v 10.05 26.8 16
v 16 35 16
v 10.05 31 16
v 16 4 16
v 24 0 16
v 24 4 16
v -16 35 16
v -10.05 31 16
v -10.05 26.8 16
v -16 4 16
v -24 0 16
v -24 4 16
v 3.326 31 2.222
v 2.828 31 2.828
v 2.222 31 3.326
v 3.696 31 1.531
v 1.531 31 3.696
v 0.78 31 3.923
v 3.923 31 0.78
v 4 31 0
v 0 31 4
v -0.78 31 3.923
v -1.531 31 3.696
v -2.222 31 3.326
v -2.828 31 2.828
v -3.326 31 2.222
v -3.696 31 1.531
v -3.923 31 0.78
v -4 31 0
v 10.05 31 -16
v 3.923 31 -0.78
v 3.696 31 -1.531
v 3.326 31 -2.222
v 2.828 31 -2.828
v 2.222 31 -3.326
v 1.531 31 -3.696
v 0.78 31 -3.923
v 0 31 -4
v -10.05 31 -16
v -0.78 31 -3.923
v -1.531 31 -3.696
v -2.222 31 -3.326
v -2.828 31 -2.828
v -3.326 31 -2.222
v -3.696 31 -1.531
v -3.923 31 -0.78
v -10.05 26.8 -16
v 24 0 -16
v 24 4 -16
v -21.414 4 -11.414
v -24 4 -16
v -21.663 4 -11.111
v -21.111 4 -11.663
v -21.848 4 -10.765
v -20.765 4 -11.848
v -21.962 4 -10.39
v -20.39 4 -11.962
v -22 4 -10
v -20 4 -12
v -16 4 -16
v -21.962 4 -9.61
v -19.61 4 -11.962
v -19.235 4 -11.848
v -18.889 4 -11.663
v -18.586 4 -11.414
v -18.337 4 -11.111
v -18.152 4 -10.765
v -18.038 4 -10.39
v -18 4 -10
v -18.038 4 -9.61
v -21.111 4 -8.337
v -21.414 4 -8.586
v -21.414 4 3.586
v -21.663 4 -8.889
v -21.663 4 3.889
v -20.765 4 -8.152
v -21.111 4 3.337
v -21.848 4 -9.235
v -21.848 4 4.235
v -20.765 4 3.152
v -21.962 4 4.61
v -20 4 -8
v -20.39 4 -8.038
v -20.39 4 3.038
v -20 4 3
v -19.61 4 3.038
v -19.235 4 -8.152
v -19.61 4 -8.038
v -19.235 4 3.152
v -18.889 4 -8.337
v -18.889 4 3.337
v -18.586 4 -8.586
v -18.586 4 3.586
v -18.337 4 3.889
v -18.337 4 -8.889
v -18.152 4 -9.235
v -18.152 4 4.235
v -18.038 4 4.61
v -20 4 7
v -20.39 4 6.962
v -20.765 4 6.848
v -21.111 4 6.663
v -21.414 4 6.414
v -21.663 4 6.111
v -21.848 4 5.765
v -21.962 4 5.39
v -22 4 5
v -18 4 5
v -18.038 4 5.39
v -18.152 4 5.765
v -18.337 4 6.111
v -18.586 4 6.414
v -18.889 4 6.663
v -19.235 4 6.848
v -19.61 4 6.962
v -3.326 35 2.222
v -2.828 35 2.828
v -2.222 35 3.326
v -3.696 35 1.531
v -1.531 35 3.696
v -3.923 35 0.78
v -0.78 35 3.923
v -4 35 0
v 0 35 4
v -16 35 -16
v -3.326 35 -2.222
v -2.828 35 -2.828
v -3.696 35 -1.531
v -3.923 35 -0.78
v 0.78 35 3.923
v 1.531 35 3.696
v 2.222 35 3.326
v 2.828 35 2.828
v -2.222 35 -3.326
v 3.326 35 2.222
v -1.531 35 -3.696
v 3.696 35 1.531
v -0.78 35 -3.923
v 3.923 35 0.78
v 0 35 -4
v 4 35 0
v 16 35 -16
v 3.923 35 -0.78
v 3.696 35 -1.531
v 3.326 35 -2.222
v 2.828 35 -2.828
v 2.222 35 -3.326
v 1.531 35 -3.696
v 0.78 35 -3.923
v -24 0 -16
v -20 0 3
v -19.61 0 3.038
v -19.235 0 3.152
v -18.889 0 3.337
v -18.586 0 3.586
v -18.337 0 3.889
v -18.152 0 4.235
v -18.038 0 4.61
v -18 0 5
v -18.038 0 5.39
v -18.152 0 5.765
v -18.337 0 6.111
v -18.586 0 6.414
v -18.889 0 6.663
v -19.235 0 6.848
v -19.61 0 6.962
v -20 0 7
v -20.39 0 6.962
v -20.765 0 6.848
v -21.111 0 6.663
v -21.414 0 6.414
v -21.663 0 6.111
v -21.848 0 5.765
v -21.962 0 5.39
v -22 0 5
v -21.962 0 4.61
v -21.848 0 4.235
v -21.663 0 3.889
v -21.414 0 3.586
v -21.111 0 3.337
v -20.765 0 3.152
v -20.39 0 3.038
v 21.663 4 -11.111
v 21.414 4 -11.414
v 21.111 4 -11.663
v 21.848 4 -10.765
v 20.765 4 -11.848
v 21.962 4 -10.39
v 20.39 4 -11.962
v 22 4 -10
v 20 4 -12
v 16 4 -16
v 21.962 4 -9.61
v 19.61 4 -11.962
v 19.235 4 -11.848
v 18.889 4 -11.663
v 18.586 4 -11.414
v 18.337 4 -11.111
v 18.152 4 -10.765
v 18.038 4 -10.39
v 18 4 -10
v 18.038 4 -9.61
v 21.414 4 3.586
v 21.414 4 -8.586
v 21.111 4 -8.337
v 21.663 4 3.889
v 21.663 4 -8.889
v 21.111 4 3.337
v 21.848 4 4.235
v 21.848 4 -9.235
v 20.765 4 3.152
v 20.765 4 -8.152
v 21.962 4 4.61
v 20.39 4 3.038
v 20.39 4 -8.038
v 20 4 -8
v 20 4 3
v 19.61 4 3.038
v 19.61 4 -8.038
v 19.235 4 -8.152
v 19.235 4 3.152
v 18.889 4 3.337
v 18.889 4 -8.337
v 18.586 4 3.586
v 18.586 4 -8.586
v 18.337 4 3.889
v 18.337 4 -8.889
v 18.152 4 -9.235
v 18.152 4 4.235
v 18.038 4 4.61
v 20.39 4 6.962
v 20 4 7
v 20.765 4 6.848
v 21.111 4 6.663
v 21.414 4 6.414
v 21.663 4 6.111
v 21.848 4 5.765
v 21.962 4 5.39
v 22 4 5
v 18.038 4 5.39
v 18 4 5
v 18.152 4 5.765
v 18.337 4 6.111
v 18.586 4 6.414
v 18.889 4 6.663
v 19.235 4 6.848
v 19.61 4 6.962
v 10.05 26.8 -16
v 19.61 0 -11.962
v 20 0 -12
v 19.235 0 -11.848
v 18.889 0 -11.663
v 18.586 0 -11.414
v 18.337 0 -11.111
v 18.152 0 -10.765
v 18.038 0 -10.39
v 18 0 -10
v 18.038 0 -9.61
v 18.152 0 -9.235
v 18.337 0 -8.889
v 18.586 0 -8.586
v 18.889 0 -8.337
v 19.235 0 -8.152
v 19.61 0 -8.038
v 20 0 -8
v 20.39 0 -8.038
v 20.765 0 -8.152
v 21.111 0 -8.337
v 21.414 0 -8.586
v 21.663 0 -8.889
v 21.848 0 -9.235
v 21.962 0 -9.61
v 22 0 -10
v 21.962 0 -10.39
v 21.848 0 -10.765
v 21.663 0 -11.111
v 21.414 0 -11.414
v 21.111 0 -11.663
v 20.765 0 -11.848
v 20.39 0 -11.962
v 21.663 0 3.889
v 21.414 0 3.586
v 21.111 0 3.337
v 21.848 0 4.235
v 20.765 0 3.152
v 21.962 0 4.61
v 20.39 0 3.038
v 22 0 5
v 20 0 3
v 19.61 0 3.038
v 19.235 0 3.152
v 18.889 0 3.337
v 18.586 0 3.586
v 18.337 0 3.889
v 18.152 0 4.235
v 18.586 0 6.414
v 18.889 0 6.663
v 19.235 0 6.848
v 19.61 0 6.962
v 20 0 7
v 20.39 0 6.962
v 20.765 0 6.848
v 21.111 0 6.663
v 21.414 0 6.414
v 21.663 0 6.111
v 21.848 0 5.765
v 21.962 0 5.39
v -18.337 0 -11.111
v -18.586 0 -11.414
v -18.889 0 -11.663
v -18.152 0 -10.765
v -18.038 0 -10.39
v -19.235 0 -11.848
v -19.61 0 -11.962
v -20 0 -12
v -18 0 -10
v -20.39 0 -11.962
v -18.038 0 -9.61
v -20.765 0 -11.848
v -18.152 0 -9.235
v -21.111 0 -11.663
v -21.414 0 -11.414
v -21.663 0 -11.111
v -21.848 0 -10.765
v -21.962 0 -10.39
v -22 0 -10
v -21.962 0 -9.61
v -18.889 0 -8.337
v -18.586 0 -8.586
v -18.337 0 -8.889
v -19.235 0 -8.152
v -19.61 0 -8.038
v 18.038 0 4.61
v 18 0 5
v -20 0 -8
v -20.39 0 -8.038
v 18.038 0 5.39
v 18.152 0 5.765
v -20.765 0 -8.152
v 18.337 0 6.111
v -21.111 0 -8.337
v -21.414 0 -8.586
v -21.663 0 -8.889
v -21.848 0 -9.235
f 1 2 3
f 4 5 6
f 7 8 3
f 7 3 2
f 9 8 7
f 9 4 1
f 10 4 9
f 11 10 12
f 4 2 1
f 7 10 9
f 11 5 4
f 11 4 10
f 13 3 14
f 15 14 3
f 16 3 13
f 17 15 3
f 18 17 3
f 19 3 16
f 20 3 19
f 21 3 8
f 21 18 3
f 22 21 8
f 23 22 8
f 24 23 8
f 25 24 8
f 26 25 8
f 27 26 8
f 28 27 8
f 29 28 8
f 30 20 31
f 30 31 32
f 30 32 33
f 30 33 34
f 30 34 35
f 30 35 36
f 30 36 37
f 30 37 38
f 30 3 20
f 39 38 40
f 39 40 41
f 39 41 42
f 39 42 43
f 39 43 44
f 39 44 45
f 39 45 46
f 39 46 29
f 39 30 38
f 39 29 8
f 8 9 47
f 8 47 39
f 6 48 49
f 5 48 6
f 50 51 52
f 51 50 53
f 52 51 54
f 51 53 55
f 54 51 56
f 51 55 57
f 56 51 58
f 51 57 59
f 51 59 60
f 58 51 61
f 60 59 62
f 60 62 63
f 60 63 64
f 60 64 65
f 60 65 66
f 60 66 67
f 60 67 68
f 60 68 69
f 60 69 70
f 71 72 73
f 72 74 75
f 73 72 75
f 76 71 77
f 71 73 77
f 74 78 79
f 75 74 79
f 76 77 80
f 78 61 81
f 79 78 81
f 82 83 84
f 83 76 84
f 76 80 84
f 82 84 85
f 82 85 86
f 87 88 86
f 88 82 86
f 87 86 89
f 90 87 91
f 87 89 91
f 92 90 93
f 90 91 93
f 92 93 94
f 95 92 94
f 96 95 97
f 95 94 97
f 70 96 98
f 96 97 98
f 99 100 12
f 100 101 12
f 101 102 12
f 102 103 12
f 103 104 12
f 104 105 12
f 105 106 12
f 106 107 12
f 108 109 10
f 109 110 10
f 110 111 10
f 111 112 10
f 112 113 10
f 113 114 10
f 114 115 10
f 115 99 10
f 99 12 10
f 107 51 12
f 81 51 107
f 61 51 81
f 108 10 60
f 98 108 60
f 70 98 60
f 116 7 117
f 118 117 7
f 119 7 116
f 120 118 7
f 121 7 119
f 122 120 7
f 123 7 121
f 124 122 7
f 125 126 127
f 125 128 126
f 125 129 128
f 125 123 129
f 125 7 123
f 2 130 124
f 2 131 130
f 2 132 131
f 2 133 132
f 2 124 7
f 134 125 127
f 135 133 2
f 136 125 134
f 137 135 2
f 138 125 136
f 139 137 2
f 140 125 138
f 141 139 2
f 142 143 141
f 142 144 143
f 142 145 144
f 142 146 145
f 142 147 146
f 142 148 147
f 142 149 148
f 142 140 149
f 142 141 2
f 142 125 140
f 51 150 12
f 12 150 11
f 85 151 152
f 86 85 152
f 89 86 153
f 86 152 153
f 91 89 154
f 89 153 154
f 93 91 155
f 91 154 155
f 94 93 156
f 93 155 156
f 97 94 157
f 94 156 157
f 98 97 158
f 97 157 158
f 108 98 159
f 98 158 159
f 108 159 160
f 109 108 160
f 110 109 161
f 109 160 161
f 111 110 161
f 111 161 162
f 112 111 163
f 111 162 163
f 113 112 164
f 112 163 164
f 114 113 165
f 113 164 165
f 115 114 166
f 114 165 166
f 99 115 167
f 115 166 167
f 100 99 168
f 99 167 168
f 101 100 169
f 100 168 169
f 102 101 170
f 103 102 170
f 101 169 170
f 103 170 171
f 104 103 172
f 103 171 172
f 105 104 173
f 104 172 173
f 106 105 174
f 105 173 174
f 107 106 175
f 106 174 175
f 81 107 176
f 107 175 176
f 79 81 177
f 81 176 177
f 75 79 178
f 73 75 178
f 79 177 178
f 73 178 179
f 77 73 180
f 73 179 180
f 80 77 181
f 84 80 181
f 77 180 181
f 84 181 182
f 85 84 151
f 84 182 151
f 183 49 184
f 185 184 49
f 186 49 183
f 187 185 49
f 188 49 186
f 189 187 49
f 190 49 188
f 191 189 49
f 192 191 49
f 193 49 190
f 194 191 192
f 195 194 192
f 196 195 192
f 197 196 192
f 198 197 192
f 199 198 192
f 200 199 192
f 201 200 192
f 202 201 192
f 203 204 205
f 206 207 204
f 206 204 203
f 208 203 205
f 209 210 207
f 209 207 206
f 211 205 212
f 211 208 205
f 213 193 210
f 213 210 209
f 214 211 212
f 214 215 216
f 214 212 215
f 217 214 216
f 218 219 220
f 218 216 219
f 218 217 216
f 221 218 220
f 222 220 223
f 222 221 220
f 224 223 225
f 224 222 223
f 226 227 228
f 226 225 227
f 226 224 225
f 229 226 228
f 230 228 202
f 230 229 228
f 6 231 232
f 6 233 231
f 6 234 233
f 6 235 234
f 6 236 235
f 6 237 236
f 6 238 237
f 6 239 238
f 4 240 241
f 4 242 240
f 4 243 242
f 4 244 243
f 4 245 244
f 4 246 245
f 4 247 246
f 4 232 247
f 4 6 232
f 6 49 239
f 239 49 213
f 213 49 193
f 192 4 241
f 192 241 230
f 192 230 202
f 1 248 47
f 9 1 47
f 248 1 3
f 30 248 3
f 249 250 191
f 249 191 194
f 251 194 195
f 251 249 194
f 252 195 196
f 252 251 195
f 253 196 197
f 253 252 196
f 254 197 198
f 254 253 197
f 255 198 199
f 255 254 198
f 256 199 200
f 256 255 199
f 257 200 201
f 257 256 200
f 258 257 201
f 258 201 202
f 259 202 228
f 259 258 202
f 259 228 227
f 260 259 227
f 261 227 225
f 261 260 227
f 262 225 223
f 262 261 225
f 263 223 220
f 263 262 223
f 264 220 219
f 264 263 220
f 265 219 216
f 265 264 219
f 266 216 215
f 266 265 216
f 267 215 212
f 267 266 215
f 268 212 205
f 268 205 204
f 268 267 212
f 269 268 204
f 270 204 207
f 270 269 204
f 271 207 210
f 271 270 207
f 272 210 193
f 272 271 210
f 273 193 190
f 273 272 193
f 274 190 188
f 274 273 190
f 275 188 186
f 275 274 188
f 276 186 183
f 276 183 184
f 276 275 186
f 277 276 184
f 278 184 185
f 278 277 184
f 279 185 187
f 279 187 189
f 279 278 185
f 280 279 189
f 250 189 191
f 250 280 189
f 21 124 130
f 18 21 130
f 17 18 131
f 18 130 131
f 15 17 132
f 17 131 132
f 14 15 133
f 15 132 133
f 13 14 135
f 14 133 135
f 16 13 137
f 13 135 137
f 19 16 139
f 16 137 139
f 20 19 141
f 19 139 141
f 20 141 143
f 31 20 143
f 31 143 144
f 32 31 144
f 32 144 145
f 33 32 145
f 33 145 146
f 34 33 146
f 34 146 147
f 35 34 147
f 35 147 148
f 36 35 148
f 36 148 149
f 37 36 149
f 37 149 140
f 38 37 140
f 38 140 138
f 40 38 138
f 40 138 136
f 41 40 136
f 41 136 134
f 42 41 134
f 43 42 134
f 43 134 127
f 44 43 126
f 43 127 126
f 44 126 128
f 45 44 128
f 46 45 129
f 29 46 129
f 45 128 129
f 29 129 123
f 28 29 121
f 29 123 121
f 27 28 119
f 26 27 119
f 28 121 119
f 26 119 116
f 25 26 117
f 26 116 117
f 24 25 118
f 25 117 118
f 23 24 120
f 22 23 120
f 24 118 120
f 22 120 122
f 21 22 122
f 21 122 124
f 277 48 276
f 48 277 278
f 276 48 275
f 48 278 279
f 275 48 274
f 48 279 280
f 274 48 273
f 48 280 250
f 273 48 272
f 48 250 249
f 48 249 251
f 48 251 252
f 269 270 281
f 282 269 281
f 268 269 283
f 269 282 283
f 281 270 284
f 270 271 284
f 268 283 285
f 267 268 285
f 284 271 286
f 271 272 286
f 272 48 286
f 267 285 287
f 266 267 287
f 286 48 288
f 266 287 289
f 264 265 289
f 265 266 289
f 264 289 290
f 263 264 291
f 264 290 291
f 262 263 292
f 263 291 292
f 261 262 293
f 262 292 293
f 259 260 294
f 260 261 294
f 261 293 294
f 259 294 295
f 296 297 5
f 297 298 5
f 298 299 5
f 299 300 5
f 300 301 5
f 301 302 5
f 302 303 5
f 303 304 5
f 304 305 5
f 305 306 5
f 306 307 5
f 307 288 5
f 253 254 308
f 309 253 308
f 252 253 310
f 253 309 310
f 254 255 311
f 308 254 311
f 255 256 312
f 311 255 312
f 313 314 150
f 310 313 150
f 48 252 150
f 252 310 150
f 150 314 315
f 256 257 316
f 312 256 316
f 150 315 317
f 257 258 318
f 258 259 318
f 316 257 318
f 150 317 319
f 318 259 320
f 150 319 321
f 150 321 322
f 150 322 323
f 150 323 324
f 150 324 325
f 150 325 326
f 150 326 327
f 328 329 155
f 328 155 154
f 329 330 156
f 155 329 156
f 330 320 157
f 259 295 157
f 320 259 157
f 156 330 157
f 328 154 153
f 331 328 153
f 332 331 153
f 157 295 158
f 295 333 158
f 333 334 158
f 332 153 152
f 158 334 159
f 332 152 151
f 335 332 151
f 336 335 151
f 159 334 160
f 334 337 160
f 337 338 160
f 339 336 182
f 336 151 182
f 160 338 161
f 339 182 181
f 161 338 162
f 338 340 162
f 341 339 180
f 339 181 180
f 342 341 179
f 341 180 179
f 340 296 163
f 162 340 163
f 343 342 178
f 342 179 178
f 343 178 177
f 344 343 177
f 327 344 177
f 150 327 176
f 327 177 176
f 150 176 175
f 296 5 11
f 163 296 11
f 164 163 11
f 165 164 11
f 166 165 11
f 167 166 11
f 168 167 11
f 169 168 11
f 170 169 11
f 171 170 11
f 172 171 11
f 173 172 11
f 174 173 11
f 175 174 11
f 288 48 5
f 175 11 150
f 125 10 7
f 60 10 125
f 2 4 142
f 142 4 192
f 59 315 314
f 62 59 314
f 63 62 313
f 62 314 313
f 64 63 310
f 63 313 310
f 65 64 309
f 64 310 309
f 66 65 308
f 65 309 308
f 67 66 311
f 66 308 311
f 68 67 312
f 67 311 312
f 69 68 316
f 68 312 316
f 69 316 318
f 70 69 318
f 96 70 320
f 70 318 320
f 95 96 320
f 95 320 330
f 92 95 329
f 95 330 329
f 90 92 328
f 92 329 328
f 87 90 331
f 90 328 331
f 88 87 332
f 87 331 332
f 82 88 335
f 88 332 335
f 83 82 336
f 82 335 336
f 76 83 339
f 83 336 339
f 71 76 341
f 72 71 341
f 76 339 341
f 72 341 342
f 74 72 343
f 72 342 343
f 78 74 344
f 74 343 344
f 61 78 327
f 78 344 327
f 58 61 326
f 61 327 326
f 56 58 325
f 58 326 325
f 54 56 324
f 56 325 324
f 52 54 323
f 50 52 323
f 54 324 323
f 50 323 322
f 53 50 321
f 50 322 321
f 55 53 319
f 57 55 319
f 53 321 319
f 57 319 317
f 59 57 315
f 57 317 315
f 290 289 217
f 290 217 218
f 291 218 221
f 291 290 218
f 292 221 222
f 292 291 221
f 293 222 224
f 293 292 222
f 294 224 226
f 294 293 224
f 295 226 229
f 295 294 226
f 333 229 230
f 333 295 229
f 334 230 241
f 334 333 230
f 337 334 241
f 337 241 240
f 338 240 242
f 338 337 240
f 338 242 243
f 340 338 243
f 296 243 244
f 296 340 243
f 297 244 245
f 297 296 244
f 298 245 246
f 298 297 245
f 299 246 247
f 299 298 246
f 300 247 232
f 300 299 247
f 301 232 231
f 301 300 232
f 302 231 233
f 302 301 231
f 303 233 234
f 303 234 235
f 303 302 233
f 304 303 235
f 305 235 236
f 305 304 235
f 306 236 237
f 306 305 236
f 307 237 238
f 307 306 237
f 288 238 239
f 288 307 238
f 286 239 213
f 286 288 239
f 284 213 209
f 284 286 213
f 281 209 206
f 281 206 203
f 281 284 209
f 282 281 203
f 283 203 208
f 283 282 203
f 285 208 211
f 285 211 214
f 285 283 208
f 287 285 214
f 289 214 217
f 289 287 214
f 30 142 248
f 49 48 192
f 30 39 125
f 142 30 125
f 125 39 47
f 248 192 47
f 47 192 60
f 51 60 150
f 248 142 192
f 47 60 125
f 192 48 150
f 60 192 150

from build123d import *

# Parameters (mm, degrees)
SKETCH1_W           = 32
SKETCH1_H           = 32
BOSS_EXTRUDE1_DEPTH = 35
SKETCH2_W           = 8
SKETCH2_H           = 32
SKETCH2_R           = 2
BOSS_EXTRUDE2_DEPTH = 4
CUT_EXTRUDE1_REACH  = 55.151
SKETCH4_W           = 20.1
SKETCH4_H           = 4.2
CUT_EXTRUDE2_REACH  = 47.354
SKETCH5_R           = 4


with BuildPart() as part:
    # Sketch1 → Boss-Extrude1 (new body)
    with BuildSketch(Plane(origin=(0, 0, 0), x_dir=(1, 0, 0), z_dir=(0, 1, 0))):
        Rectangle(SKETCH1_W, SKETCH1_H)
    extrude(amount=BOSS_EXTRUDE1_DEPTH)

    # Sketch2 → Boss-Extrude2 (add)
    with BuildSketch(Plane.XZ):
        with Locations((-20, 0)):
            Rectangle(SKETCH2_W, SKETCH2_H)
        with Locations(Location((-20, 5, 0), (0, 0, 270))):
            Circle(SKETCH2_R, mode=Mode.SUBTRACT)
        with Locations(Location((-20, -10, 0), (0, 0, 270))):
            Circle(SKETCH2_R, mode=Mode.SUBTRACT)
    boss_extrude2 = extrude(amount=-BOSS_EXTRUDE2_DEPTH)

    # Mirror1: Boss-Extrude2 across plane
    add(boss_extrude2.mirror(Plane(origin=(0, 0, 0), x_dir=(0, 0, 1), z_dir=(1, 0, 0))))

    # Sketch4 → Cut-Extrude1 (cut, up to next)
    with BuildSketch(Plane(origin=(0, 0, -16), x_dir=(-1, 0, 0), z_dir=(0, 0, -1)), mode=Mode.PRIVATE) as cut_extrude1_sk1:
        with Locations((0, 28.9)):
            Rectangle(SKETCH4_W, SKETCH4_H)
    cut_extrude1_tool1 = extrude(cut_extrude1_sk1.sketch, amount=-CUT_EXTRUDE1_REACH, mode=Mode.PRIVATE) & part.part
    add(cut_extrude1_tool1.solids().sort_by_distance((0, 28.9, -16))[0], mode=Mode.SUBTRACT)

    # Sketch5 → Cut-Extrude2 (cut, up to next)
    with BuildSketch(Plane(origin=(0, 35, 0), x_dir=(1, 0, 0), z_dir=(0, 1, 0)), mode=Mode.PRIVATE) as cut_extrude2_sk1:
        with Locations(Location((0, 0, 0), (0, 0, 270))):
            Circle(SKETCH5_R)
    cut_extrude2_tool1 = extrude(cut_extrude2_sk1.sketch, amount=-CUT_EXTRUDE2_REACH, mode=Mode.PRIVATE) & part.part
    add(cut_extrude2_tool1.solids().sort_by_distance((0, 35, 0))[0], mode=Mode.SUBTRACT)


solid = part.part
